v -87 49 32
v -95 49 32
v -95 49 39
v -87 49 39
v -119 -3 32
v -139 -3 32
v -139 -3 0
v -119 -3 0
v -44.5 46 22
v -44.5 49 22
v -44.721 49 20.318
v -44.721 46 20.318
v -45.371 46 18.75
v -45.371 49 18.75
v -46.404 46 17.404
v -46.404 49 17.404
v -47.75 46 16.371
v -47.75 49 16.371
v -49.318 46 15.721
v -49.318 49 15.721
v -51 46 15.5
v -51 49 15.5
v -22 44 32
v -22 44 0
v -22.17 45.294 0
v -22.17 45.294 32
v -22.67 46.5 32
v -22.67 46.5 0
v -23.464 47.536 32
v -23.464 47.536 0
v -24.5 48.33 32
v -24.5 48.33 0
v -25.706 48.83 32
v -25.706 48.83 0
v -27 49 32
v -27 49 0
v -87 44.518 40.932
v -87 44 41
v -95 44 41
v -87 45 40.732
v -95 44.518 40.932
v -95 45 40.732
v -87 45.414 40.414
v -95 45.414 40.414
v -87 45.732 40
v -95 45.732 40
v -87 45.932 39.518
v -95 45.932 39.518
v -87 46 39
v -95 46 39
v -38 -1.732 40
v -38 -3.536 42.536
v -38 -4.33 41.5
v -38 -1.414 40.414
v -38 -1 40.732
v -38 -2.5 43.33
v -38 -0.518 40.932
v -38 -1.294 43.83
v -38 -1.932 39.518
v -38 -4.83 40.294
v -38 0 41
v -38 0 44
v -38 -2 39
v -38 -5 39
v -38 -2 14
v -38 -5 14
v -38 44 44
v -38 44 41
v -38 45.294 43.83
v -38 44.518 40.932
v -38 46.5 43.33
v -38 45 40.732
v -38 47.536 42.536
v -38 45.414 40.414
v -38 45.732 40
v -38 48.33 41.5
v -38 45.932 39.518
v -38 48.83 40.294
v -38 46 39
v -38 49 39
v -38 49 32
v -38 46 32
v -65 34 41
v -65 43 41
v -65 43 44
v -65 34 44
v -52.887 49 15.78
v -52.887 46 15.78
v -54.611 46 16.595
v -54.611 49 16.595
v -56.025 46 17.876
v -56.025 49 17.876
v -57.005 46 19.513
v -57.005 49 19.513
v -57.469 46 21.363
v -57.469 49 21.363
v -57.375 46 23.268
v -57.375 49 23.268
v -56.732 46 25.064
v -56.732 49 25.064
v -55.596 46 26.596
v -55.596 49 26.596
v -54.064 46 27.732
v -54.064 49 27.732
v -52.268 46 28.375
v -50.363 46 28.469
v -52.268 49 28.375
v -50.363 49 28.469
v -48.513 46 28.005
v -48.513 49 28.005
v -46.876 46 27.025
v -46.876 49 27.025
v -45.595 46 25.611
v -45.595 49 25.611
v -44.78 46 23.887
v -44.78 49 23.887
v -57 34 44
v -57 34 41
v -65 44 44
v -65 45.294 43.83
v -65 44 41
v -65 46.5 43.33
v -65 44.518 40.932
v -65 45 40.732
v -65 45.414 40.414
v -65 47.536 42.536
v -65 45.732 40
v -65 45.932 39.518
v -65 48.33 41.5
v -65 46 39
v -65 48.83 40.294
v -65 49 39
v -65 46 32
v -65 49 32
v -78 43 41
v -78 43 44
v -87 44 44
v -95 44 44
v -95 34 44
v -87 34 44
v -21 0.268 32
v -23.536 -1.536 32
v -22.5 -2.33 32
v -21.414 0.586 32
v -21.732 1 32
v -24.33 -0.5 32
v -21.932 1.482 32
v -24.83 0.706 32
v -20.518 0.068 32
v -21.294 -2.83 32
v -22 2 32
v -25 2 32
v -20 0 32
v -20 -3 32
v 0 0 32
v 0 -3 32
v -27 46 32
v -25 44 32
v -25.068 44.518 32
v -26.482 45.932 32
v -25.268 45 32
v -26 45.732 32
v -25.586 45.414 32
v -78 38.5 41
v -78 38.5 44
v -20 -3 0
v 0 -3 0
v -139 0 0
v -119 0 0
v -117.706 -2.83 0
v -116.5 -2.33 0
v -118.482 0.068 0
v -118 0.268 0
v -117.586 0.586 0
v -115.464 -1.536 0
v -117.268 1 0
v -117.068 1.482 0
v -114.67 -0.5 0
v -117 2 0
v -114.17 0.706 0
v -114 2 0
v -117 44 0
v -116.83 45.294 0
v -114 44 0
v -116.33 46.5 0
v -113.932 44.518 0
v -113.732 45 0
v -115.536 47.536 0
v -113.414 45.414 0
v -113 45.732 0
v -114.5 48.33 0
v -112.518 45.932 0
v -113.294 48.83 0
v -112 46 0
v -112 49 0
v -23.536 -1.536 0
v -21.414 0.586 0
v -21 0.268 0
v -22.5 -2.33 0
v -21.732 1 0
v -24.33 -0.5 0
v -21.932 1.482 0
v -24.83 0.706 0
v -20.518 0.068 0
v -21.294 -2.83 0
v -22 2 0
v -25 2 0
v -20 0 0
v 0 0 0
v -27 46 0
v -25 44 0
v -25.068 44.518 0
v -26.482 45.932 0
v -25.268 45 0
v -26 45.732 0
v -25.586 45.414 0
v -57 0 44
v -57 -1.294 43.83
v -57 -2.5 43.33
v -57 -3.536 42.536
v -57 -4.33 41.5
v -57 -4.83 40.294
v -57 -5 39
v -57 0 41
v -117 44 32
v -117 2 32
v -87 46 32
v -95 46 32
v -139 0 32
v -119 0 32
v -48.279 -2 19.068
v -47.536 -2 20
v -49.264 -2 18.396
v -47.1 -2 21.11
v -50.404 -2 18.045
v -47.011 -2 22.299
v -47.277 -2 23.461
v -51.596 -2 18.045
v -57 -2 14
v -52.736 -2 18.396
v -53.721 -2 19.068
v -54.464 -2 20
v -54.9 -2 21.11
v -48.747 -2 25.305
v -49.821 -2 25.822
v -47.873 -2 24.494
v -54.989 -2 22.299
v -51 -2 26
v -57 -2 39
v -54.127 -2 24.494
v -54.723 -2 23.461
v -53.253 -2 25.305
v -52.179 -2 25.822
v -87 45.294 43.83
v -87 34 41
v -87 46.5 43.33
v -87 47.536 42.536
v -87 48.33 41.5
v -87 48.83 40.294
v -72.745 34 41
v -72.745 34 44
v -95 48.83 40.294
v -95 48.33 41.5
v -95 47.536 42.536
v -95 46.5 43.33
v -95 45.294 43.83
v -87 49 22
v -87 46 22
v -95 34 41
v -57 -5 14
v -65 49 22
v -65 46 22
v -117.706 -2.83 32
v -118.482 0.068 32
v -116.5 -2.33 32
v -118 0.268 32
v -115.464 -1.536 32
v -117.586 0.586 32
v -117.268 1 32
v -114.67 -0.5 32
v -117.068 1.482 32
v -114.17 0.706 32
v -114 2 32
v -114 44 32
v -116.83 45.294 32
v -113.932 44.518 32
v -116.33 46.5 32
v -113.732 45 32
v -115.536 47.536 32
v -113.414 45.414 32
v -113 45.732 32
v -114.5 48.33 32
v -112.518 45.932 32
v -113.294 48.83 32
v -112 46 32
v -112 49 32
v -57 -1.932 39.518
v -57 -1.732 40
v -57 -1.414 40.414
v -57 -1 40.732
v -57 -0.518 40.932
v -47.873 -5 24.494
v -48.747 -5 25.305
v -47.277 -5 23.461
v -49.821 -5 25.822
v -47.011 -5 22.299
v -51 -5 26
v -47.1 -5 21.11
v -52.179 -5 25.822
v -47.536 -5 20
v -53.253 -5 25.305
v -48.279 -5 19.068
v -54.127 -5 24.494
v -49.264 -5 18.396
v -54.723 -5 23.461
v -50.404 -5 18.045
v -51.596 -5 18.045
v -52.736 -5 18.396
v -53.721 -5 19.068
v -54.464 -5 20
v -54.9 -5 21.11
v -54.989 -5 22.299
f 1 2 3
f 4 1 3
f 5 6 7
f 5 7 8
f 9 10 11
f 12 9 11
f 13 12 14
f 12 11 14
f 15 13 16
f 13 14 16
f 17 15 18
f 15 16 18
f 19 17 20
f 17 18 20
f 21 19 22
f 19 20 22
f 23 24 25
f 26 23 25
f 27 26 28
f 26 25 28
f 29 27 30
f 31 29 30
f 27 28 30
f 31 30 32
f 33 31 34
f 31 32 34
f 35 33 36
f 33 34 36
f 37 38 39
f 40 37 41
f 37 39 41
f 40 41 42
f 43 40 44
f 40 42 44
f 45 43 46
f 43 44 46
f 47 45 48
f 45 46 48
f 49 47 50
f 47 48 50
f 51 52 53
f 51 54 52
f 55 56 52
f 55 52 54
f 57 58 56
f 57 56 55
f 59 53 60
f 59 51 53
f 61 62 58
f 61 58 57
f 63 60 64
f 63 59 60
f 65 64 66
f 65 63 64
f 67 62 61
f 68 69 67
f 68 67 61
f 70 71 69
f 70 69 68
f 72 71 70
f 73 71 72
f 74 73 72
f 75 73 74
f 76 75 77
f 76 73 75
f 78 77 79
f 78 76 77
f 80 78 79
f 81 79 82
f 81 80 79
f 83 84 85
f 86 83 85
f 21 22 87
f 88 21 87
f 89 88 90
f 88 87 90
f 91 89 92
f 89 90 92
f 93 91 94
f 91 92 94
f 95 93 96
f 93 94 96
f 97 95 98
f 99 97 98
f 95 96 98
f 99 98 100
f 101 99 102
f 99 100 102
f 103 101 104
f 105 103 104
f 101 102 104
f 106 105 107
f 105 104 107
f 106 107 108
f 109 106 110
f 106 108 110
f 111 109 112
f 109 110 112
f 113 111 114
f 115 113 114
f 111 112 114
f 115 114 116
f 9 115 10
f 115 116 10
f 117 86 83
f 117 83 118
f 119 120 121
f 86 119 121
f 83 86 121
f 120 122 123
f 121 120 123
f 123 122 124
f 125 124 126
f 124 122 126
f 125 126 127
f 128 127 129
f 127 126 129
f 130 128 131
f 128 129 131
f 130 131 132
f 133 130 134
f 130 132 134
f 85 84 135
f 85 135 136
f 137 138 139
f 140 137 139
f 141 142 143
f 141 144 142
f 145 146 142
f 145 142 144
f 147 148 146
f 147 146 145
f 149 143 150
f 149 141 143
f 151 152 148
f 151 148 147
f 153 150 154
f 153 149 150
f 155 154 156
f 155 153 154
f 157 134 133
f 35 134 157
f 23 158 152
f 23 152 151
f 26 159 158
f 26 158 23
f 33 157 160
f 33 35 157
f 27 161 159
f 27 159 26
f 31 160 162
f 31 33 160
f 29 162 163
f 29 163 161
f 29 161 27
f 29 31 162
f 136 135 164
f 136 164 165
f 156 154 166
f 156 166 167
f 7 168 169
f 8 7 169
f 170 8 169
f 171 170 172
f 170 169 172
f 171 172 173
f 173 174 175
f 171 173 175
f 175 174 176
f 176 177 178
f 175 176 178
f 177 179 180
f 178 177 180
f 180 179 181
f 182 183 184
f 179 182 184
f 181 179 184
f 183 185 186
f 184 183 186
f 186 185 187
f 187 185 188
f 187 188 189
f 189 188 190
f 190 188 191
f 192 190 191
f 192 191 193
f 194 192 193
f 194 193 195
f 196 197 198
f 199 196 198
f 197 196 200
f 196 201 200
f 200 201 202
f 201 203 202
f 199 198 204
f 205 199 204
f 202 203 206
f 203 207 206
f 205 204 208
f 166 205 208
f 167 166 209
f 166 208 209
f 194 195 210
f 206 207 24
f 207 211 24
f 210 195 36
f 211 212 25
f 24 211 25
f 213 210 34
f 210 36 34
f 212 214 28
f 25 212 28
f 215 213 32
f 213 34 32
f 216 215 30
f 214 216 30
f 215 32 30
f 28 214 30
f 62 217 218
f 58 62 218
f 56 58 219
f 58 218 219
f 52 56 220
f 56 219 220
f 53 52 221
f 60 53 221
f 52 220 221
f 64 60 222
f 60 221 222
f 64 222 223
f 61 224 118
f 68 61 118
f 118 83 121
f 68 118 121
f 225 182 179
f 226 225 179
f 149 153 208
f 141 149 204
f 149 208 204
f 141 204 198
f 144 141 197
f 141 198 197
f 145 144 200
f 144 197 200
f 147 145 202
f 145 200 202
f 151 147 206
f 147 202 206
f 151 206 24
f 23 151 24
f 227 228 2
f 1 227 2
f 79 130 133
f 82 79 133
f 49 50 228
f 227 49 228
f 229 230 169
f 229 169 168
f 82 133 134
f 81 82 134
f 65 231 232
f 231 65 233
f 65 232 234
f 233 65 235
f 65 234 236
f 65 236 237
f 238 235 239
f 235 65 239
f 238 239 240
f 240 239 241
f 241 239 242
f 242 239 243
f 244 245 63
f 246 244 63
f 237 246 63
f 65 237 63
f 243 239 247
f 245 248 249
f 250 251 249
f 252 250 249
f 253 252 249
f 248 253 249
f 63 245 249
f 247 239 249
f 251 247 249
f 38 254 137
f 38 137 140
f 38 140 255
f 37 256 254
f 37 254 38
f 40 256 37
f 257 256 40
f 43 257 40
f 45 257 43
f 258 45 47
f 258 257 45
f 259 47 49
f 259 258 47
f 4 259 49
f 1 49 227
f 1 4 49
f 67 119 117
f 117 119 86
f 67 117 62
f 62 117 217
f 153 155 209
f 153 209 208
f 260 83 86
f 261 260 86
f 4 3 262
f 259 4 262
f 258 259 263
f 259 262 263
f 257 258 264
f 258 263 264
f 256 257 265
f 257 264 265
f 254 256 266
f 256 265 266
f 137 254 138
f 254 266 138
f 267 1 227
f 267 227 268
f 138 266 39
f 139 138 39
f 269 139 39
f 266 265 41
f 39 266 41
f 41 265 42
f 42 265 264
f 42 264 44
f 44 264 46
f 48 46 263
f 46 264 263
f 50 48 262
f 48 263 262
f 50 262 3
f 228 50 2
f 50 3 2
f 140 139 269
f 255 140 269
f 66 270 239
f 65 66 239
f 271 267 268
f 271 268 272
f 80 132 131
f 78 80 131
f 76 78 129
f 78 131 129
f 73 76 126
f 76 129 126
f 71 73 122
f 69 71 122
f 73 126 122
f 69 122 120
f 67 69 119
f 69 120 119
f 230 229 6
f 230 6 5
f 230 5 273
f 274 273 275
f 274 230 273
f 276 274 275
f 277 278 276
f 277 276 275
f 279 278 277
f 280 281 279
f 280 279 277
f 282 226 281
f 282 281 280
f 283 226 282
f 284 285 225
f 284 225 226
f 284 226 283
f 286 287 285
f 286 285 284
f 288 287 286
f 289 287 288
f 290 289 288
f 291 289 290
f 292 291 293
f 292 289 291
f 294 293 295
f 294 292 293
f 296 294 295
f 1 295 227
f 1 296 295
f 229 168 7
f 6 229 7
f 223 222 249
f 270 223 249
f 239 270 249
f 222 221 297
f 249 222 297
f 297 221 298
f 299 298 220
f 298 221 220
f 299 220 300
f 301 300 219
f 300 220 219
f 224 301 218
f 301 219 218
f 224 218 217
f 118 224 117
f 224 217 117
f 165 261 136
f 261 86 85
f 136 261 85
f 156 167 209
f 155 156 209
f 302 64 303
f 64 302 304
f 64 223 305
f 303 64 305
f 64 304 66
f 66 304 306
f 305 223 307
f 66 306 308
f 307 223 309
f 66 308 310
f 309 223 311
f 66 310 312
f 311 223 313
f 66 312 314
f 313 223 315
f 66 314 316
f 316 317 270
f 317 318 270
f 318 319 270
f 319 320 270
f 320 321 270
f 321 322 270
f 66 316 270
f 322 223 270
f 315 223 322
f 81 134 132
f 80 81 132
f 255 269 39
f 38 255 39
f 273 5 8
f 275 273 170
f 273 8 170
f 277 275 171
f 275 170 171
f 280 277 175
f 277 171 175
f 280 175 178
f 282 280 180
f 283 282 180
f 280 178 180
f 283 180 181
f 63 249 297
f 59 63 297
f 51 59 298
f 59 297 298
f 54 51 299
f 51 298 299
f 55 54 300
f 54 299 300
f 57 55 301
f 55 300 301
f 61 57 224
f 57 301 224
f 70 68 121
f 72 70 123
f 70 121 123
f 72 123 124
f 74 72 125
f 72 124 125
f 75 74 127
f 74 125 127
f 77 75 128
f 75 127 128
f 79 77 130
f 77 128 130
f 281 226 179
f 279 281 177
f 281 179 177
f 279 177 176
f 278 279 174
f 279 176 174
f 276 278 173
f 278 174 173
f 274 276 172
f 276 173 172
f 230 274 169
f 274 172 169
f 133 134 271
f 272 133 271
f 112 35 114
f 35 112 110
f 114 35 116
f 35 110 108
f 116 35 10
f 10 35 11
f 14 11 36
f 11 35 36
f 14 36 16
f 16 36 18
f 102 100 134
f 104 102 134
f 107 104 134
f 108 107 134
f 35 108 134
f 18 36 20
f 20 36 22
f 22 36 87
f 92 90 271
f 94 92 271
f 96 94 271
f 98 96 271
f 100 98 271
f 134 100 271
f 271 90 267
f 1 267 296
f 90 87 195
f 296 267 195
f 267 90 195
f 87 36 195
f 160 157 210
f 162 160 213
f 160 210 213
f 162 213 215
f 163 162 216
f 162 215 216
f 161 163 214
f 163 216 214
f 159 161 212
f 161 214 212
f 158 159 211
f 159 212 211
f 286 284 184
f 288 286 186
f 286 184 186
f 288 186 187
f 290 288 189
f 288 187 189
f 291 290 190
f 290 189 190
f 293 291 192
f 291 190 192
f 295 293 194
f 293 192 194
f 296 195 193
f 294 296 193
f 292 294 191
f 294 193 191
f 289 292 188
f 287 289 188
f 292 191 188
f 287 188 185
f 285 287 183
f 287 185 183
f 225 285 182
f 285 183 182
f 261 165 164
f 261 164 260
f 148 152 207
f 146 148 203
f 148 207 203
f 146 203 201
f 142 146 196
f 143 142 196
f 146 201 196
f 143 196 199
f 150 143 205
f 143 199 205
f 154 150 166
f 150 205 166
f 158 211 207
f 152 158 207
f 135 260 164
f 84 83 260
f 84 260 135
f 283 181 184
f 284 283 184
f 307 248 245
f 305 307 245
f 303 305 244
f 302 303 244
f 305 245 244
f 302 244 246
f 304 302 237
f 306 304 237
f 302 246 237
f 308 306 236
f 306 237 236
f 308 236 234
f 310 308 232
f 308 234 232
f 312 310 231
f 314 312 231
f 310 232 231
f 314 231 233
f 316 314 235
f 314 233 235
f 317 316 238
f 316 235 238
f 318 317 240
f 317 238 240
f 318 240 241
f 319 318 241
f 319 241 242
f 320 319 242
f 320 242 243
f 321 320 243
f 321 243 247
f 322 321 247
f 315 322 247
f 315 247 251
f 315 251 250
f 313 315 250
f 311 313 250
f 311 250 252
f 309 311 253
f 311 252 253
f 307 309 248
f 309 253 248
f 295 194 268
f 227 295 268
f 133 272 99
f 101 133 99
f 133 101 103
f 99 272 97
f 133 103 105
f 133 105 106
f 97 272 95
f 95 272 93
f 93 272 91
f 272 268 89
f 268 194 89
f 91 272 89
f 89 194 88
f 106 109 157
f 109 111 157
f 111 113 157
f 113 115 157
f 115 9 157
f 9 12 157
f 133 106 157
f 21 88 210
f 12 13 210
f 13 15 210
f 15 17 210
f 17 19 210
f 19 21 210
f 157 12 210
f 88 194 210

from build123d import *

# Parameters (mm, degrees)
BRIDA_BASE1_DEPTH     = 32
BRIDA_BASE2_DEPTH     = 8
CROQUIS9_W            = 22
CROQUIS9_H            = 10
CORTAR_EXTRUIR1_DEPTH = 10
CORTAR_EXTRUIR2_DEPTH = 3
BRIDA_BASE6_DEPTH     = 27
CROQUIS29_W           = 8
CROQUIS29_H           = 40
CORTAR_EXTRUIR7_DEPTH = 33
CROQUIS30_W           = 3
CROQUIS30_H           = 9
BRIDA_BASE7_DEPTH     = 13
CORTAR_EXTRUIR8_DEPTH = 3
CROQUIS34_R           = 4
CORTAR_EXTRUIR9_DEPTH = 3


# Sheet-metal steps are written as plain solids
with BuildPart() as part:
    # Croquis1 → Brida base1 (new body)
    with BuildSketch(Plane.XY):
        with BuildLine():
            Line((0, 0), (-20, 0))
            ThreePointArc((-20, 0), (-21.414213562, 0.585786438), (-22, 2))
            Line((-22, 2), (-22, 44))
            ThreePointArc((-22, 44), (-23.464466094, 47.535533906), (-27, 49))
            Line((-27, 49), (-112, 49))
            ThreePointArc((-112, 49), (-115.535533906, 47.535533906), (-117, 44))
            Line((-117, 44), (-117, 2))
            ThreePointArc((-117, 2), (-117.585786438, 0.585786438), (-119, 0))
            Line((-119, 0), (-139, 0))
            Line((-139, 0), (-139, -3))
            Line((-139, -3), (-119, -3))
            ThreePointArc((-119, -3), (-115.464466094, -1.535533906), (-114, 2))
            Line((-114, 2), (-114, 44))
            ThreePointArc((-114, 44), (-113.414213562, 45.414213562), (-112, 46))
            Line((-112, 46), (-27, 46))
            ThreePointArc((-27, 46), (-25.585786438, 45.414213562), (-25, 44))
            Line((-25, 44), (-25, 2))
            ThreePointArc((-25, 2), (-23.535533906, -1.535533906), (-20, -3))
            Line((-20, -3), (0, -3))
            Line((0, -3), (0, 0))
        make_face()
    extrude(amount=BRIDA_BASE1_DEPTH)

    # Croquis9 → Cortar-Extruir1 (cut)
    with BuildSketch(Plane(origin=(0, 49, 0), x_dir=(1, 0, 0), z_dir=(0, 1, 0))):
        with Locations((-76, -27)):
            Rectangle(CROQUIS9_W, CROQUIS9_H)
    extrude(amount=-CORTAR_EXTRUIR1_DEPTH, mode=Mode.SUBTRACT)

    # Croquis19 → Cortar-Extruir2 (cut)
    with BuildSketch(Plane(origin=(0, 49, 0), x_dir=(1, 0, 0), z_dir=(0, 1, 0))):
        with BuildLine():
            ThreePointArc((-51, -15.5), (-55.596194078, -26.596194078), (-44.5, -22))
            Line((-44.5, -22), (-51, -22))
            Line((-51, -22), (-51, -15.5))
        make_face()
        with BuildLine():
            Line((-51, -22), (-44.5, -22))
            ThreePointArc((-44.5, -22), (-46.403805922, -17.403805922), (-51, -15.5))
            Line((-51, -15.5), (-51, -22))
        make_face()
    extrude(amount=-CORTAR_EXTRUIR2_DEPTH, mode=Mode.SUBTRACT)


with BuildPart() as body_2:
    # Croquis6 → Brida base2 (new body)
    with BuildSketch(Plane(origin=(-95, 0, 0), x_dir=(0, 0, -1), z_dir=(1, 0, 0))):
        with BuildLine():
            Line((-32, 49), (-39, 49))
            ThreePointArc((-39, 49), (-42.535533906, 47.535533906), (-44, 44))
            Line((-44, 44), (-44, 34))
            Line((-44, 34), (-41, 34))
            Line((-41, 34), (-41, 44))
            ThreePointArc((-41, 44), (-40.414213562, 45.414213562), (-39, 46))
            Line((-39, 46), (-32, 46))
            Line((-32, 46), (-32, 49))
        make_face()
    extrude(amount=BRIDA_BASE2_DEPTH)


with BuildPart() as body_3:
    # Croquis26 → Brida base6 (new body)
    with BuildSketch(Plane(origin=(-65, 0, 0), x_dir=(0, 0, -1), z_dir=(1, 0, 0))):
        with BuildLine():
            Line((-32, 49), (-39, 49))
            ThreePointArc((-39, 49), (-42.535533906, 47.535533906), (-44, 44))
            Line((-44, 44), (-44, 0))
            ThreePointArc((-44, 0), (-42.535533906, -3.535533906), (-39, -5))
            Line((-39, -5), (-14, -5))
            Line((-14, -5), (-14, -2))
            Line((-14, -2), (-39, -2))
            ThreePointArc((-39, -2), (-40.414213562, -1.414213562), (-41, 0))
            Line((-41, 0), (-41, 44))
            ThreePointArc((-41, 44), (-40.414213562, 45.414213562), (-39, 46))
            Line((-39, 46), (-32, 46))
            Line((-32, 46), (-32, 49))
        make_face()
    extrude(amount=BRIDA_BASE6_DEPTH)

    # Croquis29 → Cortar-Extruir7 (cut)
    with BuildSketch(Plane.XY.offset(44)):
        with Locations((-61, 14)):
            Rectangle(CROQUIS29_W, CROQUIS29_H)
    extrude(amount=-CORTAR_EXTRUIR7_DEPTH, mode=Mode.SUBTRACT)

    # Croquis34 → Cortar-Extruir9 (cut)
    with BuildSketch(Plane(origin=(0, -2, 0), x_dir=(1, 0, 0), z_dir=(0, 1, 0))):
        with Locations(Location((-51, -22, 0), (0, 0, 270))):
            Circle(CROQUIS34_R)
    extrude(amount=-CORTAR_EXTRUIR9_DEPTH, mode=Mode.SUBTRACT)


with BuildPart() as body_4:
    # Croquis30 → Brida base7 (new body)
    with BuildSketch(Plane.ZY.offset(65)):
        with Locations((42.5, 38.5)):
            Rectangle(CROQUIS30_W, CROQUIS30_H)
    extrude(amount=BRIDA_BASE7_DEPTH)

    # Croquis33 → Cortar-Extruir8 (cut)
    with BuildSketch(Plane.XY.offset(44)):
        Polygon((-78, 38.5), (-72.745469491, 34), (-78, 34), align=None)
    extrude(amount=-CORTAR_EXTRUIR8_DEPTH, mode=Mode.SUBTRACT)


solid = Compound([part.part, body_2.part, body_3.part, body_4.part])
